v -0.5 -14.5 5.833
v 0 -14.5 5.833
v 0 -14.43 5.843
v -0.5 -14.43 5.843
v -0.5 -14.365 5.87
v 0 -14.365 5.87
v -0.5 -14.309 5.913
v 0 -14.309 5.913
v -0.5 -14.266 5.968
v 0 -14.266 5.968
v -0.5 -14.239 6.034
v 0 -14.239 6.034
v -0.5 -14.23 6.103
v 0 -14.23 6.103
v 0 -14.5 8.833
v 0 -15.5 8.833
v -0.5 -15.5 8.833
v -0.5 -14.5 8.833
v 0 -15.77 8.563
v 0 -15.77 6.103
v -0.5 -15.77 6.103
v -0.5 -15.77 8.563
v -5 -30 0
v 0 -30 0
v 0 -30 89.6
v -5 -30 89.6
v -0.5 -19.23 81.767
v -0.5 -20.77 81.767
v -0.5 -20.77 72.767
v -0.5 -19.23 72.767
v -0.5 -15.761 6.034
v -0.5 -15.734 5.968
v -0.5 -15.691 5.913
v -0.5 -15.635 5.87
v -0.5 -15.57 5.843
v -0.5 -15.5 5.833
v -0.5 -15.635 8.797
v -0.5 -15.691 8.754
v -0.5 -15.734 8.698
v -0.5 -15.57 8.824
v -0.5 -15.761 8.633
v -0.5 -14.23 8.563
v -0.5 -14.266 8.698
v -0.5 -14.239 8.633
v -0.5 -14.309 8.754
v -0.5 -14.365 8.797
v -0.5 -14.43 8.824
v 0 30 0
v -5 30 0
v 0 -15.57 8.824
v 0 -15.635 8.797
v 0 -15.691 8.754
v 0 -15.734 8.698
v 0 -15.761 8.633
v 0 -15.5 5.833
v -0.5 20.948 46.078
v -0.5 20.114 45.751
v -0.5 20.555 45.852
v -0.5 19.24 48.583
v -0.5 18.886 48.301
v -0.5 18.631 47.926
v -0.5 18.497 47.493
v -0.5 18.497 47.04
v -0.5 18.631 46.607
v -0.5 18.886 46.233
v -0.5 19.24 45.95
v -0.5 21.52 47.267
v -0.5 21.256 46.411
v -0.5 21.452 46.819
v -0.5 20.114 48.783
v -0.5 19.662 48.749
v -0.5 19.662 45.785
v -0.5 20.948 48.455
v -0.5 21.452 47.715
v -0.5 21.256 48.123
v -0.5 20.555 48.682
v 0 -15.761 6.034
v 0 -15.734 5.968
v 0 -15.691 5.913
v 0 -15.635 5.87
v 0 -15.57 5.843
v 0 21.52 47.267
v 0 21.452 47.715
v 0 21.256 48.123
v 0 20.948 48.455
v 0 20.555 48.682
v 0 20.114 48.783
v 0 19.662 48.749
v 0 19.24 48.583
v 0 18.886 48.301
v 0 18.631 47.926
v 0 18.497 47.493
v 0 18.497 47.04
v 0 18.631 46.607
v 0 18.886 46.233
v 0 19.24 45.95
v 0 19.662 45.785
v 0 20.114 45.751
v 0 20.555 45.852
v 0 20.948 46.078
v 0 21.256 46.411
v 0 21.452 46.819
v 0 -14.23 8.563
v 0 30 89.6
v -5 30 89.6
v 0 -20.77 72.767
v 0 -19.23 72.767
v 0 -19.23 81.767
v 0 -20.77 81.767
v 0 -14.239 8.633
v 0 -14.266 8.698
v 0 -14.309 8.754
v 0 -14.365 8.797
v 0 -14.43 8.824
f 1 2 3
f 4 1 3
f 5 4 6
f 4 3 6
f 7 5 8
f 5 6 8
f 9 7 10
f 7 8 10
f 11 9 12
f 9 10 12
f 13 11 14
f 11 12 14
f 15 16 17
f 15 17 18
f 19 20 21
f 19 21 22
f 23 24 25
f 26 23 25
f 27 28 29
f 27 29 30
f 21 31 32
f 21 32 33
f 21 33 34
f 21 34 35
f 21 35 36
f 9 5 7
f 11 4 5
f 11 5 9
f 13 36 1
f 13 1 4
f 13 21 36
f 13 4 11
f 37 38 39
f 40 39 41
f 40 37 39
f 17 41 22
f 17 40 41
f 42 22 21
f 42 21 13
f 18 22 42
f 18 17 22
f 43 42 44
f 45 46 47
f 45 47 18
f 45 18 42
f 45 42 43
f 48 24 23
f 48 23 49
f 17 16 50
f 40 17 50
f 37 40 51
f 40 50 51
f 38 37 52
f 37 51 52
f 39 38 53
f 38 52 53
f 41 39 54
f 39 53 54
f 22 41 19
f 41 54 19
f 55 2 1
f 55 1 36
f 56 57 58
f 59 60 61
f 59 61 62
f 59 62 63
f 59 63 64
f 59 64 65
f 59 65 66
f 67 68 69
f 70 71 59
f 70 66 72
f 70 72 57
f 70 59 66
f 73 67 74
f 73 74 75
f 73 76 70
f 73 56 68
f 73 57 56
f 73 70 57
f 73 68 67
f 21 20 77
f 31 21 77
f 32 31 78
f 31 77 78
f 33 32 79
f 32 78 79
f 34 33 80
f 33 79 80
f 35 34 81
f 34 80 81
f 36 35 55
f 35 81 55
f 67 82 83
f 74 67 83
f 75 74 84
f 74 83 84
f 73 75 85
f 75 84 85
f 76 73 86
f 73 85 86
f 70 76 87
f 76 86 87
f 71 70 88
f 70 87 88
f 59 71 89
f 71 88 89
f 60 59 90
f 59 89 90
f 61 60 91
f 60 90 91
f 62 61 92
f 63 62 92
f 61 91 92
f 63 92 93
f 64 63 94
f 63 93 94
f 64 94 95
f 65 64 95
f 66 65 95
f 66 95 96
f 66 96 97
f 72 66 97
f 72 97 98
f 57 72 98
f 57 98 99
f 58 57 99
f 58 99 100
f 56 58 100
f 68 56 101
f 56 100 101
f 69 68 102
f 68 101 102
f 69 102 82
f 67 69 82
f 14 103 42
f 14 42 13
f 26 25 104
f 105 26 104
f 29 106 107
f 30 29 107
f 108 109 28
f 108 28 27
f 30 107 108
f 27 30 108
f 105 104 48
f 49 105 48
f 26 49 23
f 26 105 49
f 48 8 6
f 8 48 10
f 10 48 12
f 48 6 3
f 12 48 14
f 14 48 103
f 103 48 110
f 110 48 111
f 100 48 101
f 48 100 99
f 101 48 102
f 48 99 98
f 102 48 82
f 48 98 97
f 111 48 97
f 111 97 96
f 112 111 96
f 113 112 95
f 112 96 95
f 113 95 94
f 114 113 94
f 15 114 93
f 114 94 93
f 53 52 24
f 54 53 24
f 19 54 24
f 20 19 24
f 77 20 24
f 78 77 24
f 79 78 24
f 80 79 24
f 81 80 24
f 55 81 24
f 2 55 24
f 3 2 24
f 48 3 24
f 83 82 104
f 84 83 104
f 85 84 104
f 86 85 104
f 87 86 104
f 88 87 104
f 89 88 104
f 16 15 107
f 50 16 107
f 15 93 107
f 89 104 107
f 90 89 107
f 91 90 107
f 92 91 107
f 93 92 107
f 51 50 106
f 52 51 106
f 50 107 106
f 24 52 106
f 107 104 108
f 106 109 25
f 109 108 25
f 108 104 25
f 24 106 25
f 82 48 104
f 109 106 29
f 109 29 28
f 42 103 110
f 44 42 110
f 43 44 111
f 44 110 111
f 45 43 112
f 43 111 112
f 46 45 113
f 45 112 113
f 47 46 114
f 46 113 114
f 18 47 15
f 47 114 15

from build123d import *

# Parameters (mm, degrees)
PAD_DEPTH       = 5
SKETCH001_R     = 1.52
POCKET_DEPTH    = 0.5
SKETCH002_W     = 1.54
SKETCH002_H     = 9
POCKET001_DEPTH = 0.5
POCKET002_DEPTH = 0.5


with BuildPart() as part:
    # Sketch → Pad (new body)
    with BuildSketch(Plane.YZ):
        Polygon((0, 0), (-30, 0), (-30, 89.600318), (30, 89.600318), (30, 0), align=None)
    extrude(amount=-PAD_DEPTH)

    # Sketch001 → Pocket (cut)
    with BuildSketch(Plane.YZ):
        with Locations((20, 47.266852)):
            Circle(SKETCH001_R)
    extrude(amount=-POCKET_DEPTH, mode=Mode.SUBTRACT)

    # Sketch002 → Pocket001 (cut)
    with BuildSketch(Plane.YZ):
        with Locations((-20, 77.266852)):
            Rectangle(SKETCH002_W, SKETCH002_H)
    extrude(amount=-POCKET001_DEPTH, mode=Mode.SUBTRACT)

    # Sketch003 → Pocket002 (cut)
    with BuildSketch(Plane.YZ):
        with BuildLine():
            ThreePointArc((-15.5, 8.833466), (-15.690919, 8.754384), (-15.77, 8.563466))
            Line((-15.77, 6.103466), (-15.77, 8.563466))
            ThreePointArc((-15.77, 6.103466), (-15.690919, 5.912547), (-15.5, 5.833466))
            Line((-14.5, 5.833466), (-15.5, 5.833466))
            ThreePointArc((-14.5, 5.833466), (-14.309081, 5.912547), (-14.23, 6.103466))
            Line((-14.23, 8.563466), (-14.23, 6.103466))
            ThreePointArc((-14.23, 8.563466), (-14.309081, 8.754384), (-14.5, 8.833466))
            Line((-15.5, 8.833466), (-14.5, 8.833466))
        make_face()
    extrude(amount=-POCKET002_DEPTH, mode=Mode.SUBTRACT)


solid = part.part
